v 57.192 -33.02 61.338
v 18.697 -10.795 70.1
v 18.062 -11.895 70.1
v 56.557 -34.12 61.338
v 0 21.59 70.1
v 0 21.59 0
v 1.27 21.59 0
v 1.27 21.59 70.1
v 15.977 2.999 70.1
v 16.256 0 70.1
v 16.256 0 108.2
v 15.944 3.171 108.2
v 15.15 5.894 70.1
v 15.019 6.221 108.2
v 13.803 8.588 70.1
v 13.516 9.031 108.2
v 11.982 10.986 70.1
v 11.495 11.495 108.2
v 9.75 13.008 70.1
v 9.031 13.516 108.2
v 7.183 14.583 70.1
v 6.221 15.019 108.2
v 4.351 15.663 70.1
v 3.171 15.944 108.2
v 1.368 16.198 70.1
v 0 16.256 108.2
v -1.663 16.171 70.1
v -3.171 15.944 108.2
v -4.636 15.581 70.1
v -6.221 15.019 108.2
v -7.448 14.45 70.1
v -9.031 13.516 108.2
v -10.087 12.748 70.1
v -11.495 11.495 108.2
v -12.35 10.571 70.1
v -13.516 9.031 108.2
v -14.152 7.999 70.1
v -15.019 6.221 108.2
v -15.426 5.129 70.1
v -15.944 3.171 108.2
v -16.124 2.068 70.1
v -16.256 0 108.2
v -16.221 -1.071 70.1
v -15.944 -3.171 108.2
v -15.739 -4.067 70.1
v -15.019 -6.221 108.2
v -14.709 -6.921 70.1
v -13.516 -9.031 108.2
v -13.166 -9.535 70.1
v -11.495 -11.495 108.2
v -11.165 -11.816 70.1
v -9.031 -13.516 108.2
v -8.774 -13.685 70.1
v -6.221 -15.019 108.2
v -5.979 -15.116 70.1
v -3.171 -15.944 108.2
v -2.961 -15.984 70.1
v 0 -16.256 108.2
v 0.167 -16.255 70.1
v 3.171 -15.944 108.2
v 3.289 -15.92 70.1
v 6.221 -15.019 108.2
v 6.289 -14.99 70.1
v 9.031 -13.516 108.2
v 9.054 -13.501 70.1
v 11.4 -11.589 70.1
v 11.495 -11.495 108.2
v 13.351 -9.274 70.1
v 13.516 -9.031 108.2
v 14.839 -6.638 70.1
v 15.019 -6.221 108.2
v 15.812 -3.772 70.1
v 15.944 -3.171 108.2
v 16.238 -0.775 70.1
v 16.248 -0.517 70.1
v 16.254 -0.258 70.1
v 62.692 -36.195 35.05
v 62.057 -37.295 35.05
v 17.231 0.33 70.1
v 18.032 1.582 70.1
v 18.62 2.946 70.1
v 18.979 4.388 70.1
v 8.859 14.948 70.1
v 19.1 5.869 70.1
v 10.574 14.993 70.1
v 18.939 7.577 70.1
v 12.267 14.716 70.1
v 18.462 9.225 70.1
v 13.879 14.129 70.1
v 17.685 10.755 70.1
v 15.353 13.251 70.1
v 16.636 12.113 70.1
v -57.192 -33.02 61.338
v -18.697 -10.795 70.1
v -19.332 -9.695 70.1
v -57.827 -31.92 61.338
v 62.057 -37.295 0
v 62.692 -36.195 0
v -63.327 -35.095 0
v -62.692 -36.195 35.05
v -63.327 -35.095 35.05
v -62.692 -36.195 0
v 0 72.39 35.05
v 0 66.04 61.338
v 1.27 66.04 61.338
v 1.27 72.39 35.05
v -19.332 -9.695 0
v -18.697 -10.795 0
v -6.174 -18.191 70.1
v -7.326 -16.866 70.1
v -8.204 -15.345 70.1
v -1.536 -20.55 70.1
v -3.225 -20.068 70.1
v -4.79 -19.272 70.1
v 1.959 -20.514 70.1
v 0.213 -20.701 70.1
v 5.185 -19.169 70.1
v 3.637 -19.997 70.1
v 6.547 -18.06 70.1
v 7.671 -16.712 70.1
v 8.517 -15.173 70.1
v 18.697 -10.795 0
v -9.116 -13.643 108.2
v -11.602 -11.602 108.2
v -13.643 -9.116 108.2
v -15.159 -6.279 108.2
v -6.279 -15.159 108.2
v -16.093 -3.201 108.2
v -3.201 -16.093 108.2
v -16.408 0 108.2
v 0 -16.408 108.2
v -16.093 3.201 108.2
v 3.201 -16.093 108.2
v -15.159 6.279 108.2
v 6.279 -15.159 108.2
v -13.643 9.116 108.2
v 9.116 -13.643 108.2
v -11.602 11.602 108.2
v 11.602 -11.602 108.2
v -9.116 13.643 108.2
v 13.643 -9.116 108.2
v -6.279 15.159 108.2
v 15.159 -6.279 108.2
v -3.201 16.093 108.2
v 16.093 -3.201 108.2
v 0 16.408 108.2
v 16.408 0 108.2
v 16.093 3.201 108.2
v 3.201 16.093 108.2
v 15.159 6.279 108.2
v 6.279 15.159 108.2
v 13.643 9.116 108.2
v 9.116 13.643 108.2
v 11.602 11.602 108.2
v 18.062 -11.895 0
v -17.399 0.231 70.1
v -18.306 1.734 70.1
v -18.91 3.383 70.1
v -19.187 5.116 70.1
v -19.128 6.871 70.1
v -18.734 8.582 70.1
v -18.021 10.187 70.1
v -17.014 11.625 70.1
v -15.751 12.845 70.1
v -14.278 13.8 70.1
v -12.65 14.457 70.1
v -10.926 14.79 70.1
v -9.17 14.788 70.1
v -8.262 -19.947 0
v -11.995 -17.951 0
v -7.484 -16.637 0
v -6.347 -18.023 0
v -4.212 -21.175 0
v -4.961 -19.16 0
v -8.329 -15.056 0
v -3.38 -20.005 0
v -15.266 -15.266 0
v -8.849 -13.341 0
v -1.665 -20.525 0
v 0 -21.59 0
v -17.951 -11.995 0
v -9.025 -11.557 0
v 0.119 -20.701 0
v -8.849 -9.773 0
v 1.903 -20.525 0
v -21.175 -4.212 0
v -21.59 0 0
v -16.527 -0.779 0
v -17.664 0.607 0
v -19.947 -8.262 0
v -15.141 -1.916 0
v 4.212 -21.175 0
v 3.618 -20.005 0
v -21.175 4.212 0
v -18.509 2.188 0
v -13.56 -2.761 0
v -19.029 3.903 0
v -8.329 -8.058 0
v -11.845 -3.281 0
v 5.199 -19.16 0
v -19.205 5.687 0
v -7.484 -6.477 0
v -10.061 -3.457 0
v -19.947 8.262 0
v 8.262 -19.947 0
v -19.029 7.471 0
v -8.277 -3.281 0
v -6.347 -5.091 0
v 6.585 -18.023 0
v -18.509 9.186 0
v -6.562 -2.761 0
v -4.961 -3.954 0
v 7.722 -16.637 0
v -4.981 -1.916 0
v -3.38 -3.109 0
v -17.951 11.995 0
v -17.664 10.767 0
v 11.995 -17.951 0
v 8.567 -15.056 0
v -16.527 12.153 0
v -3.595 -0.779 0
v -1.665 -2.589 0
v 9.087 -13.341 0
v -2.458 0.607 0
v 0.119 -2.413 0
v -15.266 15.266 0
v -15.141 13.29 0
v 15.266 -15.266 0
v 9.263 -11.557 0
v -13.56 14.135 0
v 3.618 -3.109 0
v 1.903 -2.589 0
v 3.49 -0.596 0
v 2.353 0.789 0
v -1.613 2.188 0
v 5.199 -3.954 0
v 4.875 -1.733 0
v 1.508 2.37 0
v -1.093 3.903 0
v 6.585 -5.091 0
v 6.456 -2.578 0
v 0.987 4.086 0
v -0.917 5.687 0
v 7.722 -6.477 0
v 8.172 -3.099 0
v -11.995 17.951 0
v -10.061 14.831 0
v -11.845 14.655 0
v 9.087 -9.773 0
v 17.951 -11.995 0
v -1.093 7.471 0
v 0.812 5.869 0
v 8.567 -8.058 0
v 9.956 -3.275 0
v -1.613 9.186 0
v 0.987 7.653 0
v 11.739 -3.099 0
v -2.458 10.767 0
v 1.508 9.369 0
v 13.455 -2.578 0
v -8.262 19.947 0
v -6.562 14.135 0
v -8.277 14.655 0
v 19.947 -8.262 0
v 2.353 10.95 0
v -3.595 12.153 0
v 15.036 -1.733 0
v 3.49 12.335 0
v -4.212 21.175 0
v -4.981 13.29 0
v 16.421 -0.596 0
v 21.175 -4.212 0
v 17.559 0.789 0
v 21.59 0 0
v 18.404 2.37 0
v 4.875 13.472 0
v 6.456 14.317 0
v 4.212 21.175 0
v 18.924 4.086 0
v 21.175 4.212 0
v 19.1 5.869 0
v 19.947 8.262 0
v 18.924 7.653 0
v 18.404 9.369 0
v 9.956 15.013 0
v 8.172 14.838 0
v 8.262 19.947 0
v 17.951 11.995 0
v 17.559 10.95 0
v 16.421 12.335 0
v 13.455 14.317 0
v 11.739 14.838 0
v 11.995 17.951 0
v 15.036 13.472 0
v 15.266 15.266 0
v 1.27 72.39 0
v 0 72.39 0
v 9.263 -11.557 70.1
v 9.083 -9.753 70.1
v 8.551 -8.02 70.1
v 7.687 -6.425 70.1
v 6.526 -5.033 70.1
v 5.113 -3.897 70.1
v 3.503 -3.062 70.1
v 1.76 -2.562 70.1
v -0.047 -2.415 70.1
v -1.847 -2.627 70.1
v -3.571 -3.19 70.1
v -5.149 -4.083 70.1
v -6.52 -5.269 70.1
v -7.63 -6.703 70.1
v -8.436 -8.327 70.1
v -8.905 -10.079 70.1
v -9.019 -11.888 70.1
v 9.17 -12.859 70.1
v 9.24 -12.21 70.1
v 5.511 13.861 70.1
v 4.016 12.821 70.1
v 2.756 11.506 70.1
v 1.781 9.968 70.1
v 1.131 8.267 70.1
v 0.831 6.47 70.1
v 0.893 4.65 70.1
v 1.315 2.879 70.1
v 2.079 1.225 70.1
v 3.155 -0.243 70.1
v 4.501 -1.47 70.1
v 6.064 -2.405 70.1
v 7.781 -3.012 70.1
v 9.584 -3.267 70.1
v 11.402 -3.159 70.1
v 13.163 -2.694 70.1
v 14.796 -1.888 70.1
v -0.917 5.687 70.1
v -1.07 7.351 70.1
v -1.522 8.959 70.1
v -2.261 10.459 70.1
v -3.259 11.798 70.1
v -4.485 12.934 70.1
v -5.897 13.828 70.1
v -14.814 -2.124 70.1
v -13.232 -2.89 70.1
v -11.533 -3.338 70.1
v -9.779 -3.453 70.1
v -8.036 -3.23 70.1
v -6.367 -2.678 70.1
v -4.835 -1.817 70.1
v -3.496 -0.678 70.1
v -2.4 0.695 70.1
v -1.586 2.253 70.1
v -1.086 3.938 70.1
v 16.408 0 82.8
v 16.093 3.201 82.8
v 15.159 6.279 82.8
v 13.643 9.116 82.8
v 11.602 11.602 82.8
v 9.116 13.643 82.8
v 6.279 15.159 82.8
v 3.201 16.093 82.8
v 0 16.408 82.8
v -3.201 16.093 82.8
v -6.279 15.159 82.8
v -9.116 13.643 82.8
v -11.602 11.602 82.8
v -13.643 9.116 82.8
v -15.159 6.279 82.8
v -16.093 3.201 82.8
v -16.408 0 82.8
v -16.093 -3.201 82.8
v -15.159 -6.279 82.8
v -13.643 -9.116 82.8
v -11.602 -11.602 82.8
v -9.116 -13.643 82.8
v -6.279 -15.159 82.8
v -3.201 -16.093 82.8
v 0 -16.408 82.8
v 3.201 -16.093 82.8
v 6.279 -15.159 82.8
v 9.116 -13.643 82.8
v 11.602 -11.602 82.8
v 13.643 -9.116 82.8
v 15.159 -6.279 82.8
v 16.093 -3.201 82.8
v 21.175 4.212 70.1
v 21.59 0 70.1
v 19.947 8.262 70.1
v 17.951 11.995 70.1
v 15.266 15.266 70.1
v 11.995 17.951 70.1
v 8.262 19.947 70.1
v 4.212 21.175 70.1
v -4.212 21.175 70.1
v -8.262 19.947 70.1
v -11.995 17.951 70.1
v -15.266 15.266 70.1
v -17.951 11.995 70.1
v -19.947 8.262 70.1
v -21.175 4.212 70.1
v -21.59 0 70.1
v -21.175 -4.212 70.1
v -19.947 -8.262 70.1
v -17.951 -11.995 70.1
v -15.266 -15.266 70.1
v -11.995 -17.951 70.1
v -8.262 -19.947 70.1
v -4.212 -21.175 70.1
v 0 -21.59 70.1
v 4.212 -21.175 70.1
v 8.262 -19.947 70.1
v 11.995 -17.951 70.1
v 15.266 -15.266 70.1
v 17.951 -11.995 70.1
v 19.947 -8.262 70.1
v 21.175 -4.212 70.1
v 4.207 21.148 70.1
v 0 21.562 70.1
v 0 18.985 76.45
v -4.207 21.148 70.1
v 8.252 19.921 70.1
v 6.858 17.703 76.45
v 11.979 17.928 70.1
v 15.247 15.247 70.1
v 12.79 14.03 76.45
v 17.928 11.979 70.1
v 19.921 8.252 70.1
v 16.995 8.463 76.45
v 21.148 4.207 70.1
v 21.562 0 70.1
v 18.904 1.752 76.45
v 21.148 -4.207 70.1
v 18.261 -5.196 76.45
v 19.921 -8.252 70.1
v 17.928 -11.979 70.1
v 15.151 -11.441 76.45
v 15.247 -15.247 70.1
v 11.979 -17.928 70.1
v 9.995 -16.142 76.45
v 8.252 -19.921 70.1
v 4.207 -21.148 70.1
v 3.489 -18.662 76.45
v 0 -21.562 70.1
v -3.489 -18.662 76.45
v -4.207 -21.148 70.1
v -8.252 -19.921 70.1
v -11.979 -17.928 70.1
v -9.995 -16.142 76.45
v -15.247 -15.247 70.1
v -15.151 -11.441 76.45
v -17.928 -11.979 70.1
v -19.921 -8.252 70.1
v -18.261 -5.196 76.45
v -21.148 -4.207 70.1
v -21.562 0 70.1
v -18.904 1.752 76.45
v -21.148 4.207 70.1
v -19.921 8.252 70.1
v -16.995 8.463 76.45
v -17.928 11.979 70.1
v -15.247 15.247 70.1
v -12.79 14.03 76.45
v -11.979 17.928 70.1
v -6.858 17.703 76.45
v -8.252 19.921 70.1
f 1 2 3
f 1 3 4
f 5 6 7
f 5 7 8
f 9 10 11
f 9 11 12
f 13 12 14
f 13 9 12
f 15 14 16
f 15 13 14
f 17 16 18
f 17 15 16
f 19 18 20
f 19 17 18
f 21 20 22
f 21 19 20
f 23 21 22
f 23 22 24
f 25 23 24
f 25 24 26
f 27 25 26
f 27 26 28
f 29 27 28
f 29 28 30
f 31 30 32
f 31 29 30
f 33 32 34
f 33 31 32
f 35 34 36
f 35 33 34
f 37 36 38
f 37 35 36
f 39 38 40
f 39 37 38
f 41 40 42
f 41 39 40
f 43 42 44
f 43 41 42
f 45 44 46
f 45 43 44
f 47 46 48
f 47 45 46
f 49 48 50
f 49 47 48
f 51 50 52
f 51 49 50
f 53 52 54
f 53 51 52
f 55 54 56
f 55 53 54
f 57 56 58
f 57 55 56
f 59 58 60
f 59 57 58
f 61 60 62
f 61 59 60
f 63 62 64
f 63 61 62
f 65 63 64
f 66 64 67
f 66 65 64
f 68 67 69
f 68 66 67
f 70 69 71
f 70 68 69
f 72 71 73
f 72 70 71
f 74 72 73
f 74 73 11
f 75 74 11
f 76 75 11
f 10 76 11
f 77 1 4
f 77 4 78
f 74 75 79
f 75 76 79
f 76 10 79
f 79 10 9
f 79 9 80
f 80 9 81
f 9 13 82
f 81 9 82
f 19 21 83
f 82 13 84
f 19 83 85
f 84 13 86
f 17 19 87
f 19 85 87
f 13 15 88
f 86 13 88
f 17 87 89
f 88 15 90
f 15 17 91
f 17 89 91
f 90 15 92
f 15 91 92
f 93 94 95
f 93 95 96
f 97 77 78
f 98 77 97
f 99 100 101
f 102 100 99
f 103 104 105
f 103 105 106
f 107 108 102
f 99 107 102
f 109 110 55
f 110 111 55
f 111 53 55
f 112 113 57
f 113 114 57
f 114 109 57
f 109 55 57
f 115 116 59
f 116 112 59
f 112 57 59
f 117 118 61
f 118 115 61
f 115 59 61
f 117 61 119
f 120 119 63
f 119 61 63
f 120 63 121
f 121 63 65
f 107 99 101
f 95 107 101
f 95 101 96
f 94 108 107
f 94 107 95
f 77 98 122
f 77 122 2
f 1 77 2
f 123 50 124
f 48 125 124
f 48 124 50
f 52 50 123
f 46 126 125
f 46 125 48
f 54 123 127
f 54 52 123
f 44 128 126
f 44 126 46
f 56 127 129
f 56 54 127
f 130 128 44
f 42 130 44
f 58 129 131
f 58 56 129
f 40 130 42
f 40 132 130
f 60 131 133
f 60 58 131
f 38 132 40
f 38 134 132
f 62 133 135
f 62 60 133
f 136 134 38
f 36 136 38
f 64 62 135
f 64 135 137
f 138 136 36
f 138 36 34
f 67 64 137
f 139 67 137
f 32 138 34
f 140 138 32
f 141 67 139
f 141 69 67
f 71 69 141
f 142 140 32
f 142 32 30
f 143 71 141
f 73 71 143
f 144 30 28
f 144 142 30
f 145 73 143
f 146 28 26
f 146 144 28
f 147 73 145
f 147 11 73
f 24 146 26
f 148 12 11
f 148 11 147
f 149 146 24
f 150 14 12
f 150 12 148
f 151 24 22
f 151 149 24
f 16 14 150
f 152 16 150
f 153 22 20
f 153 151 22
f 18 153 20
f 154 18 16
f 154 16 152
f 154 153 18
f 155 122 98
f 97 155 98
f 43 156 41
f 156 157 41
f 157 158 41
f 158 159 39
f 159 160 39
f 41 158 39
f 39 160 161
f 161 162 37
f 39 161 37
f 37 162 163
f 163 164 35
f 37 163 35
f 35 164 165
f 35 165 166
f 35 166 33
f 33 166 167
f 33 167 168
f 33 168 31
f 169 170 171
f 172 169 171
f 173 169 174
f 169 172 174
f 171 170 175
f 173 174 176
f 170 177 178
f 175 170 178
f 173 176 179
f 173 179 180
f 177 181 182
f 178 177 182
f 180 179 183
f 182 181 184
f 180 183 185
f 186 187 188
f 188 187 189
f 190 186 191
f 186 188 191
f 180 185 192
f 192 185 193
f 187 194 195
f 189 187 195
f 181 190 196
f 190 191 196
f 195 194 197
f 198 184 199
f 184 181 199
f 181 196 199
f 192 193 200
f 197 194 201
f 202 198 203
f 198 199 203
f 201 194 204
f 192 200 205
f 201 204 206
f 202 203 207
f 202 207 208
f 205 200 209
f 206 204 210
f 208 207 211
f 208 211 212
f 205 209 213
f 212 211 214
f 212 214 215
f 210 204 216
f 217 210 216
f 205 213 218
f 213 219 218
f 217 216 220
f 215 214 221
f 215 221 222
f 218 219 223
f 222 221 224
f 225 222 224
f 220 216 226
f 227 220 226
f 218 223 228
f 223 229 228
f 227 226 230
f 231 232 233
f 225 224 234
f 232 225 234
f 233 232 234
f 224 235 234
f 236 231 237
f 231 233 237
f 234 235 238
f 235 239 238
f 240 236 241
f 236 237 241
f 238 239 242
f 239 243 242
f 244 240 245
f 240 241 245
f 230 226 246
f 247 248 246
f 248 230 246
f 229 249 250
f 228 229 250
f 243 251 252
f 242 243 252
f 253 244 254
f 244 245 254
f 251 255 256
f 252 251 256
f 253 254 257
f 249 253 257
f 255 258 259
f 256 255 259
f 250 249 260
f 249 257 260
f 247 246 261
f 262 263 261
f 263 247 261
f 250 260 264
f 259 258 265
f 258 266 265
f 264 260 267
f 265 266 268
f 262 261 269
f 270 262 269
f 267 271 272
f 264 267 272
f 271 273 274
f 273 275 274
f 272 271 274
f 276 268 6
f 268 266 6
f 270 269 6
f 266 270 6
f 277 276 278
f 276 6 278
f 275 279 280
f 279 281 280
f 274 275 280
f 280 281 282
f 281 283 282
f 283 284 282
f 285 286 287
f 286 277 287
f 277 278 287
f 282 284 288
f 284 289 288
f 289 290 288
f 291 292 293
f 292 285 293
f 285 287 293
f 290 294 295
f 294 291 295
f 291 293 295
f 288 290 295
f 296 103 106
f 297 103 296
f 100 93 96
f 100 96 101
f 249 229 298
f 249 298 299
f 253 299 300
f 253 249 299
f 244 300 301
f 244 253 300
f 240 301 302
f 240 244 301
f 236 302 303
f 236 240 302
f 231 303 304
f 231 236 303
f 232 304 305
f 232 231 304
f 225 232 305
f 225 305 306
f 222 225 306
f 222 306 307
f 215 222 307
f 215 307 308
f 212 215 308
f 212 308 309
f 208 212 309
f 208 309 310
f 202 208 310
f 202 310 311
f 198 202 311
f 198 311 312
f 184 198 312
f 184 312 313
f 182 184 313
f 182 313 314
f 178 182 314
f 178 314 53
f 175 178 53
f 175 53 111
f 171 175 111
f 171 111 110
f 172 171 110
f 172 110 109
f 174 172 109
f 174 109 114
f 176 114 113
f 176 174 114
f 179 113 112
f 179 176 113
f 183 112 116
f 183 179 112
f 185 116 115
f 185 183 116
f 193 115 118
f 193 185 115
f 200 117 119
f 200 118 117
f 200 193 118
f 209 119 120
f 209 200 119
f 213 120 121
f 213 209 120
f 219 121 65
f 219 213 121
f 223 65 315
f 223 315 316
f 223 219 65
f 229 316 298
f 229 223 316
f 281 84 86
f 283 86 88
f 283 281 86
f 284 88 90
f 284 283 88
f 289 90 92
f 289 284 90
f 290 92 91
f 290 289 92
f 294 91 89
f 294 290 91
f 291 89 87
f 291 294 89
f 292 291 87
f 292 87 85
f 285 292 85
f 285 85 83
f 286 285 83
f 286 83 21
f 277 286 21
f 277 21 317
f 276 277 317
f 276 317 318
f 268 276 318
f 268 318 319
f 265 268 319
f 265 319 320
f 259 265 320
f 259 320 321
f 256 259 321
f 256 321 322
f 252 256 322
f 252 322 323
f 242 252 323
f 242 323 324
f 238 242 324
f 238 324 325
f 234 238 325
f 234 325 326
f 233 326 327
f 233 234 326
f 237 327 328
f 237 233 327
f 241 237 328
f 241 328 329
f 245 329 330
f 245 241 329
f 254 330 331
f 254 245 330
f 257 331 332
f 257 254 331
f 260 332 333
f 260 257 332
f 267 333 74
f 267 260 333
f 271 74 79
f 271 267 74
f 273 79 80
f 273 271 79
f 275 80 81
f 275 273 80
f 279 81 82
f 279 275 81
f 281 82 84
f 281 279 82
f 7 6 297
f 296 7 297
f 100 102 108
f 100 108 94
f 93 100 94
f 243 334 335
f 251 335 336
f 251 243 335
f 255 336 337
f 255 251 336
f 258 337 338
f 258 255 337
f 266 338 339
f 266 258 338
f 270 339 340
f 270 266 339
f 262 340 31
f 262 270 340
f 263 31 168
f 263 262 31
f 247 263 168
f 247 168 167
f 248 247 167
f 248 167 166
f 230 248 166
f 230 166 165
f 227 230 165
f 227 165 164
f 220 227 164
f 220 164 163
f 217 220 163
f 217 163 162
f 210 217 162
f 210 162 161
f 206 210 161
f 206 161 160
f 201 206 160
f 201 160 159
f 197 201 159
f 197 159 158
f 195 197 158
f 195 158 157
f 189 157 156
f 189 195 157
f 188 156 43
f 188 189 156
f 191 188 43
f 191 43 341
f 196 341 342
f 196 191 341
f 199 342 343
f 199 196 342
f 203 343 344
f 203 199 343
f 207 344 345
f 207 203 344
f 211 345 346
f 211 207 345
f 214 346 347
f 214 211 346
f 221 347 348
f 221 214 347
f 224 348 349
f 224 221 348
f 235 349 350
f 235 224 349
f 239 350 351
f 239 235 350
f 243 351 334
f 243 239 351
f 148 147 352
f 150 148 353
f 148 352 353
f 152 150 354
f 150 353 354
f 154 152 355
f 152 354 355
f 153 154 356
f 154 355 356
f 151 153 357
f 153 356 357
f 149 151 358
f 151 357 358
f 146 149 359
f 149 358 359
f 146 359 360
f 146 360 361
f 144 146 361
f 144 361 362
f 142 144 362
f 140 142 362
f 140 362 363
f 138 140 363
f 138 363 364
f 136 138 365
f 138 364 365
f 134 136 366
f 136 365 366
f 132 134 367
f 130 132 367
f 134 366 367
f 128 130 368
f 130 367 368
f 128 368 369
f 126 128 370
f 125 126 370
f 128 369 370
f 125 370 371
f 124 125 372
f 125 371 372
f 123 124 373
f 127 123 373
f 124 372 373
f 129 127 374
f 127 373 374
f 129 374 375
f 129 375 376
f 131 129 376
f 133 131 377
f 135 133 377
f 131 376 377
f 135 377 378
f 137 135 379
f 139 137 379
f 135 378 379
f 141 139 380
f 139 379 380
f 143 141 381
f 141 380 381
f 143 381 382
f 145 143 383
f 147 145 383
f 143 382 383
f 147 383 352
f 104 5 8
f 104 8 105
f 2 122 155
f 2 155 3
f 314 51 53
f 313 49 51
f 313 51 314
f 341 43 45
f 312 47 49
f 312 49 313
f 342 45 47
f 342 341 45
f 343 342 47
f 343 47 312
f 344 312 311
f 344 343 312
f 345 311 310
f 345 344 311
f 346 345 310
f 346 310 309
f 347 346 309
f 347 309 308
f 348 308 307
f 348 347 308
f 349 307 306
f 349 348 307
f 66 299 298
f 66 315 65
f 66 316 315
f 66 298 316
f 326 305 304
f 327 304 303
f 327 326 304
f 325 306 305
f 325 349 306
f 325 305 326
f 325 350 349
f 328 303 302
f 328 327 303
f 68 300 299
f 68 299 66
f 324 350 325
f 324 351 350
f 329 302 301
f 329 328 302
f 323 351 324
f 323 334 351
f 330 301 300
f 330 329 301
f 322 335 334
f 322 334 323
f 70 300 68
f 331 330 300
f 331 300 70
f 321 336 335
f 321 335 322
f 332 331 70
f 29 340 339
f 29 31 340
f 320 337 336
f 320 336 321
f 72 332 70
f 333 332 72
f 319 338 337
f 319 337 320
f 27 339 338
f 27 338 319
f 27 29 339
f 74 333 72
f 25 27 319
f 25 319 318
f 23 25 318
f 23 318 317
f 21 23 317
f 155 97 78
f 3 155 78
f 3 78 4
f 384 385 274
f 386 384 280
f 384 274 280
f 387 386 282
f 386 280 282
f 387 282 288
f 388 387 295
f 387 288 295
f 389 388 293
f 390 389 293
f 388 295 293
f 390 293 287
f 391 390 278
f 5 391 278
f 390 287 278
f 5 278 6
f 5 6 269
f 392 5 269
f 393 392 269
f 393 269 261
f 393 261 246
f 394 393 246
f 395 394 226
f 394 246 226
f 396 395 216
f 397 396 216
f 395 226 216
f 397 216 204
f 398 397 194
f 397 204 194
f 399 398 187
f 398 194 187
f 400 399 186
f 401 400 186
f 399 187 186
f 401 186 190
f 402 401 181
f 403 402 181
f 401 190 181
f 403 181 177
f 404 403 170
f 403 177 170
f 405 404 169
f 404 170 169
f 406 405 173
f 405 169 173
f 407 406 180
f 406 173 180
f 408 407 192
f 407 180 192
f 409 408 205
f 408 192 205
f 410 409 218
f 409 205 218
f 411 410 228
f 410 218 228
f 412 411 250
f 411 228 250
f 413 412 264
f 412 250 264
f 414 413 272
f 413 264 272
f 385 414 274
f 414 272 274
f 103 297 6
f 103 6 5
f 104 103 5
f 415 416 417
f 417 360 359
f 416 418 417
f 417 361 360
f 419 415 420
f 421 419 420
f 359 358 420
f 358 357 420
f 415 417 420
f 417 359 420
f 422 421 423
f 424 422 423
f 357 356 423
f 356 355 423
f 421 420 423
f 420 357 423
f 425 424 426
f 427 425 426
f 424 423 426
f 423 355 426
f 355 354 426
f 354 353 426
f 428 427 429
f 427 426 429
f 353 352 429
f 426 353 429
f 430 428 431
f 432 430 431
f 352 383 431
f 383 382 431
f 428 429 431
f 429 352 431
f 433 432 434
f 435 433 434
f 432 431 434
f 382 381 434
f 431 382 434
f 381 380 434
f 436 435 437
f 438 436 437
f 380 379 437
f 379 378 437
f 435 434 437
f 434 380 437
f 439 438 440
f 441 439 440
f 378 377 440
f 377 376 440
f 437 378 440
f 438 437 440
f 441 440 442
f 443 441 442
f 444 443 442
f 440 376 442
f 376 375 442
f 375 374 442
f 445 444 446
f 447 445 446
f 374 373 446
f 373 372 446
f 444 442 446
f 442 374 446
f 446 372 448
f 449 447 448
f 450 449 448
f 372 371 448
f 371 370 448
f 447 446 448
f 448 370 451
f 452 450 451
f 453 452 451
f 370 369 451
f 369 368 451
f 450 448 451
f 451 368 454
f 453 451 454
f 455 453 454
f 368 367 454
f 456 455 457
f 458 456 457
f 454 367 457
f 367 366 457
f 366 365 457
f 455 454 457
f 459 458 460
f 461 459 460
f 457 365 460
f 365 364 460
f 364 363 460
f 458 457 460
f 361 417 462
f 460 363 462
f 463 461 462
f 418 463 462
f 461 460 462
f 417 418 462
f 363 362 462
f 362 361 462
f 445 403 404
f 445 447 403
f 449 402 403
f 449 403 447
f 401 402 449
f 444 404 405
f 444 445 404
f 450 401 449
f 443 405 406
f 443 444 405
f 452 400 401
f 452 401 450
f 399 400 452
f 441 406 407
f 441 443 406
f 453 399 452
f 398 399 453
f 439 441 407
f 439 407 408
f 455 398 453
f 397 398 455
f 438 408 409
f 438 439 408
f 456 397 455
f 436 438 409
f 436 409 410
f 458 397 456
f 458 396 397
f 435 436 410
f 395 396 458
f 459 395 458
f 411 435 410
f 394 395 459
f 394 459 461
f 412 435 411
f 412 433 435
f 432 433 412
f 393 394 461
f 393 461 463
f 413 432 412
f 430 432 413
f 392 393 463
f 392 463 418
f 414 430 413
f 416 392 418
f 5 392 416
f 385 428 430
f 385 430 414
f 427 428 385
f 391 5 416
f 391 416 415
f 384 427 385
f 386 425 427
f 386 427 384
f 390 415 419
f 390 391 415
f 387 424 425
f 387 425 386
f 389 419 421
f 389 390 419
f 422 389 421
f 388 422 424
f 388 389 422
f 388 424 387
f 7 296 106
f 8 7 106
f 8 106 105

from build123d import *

# Parameters (mm, degrees)
SKETCH1_R           = 21.59
SKETCH1_R_2         = 9.144
BOSS_EXTRUDE1_DEPTH = 70.1
SKETCH2_R           = 16.4084
SKETCH2_R_2         = 16.256
BOSS_EXTRUDE2_DEPTH = 38.1
BOSS_EXTRUDE6_DEPTH = 1.27
CIRPATTERN7_COUNT   = 3


with BuildPart() as part:
    # Sketch1 → Boss-Extrude1 (new body)
    with BuildSketch(Plane.XY):
        Circle(SKETCH1_R)
        with Locations((0.118855304, -11.557)):
            Circle(SKETCH1_R_2, mode=Mode.SUBTRACT)
        with Locations((9.955579479, 5.869470694)):
            Circle(SKETCH1_R_2, mode=Mode.SUBTRACT)
        with Locations((-10.060900468, 5.687049391)):
            Circle(SKETCH1_R_2, mode=Mode.SUBTRACT)
    extrude(amount=BOSS_EXTRUDE1_DEPTH)

    # Sketch2 → Boss-Extrude2 (add)
    with BuildSketch(Plane.XY.offset(70.1)):
        Circle(SKETCH2_R)
        Circle(SKETCH2_R_2, mode=Mode.SUBTRACT)
    extrude(amount=BOSS_EXTRUDE2_DEPTH)

    # Sketch8 → Revolve3 (revolve)
    with BuildSketch(Plane(origin=(0, 0, 0), x_dir=(0, 0, -1), z_dir=(1, 0, 0))):
        Polygon((-70.1, 21.56234654), (-82.8, 16.4084), (-70.1, 16.4084), align=None)
    revolve(axis=Axis((0, 0, 126.159811209), (0, 0, -1)))


with BuildPart() as body_2:
    # Sketch14 → Boss-Extrude6 (new body)
    with BuildSketch(Plane(origin=(0, 0, 0), x_dir=(0, 0, -1), z_dir=(1, 0, 0))):
        Polygon((-70.1, 21.59), (-61.3375, 66.04), (-35.05, 72.39), (0, 72.39), (0, 46.99), (0, 21.59), align=None)
    extrude(amount=BOSS_EXTRUDE6_DEPTH)


with BuildPart() as cirpattern7_1:
    # CirPattern7: pattern copy
    add(body_2.part.rotate(Axis((0, 0, 0), (0, 0, 1)), 1 * 360 / CIRPATTERN7_COUNT))


with BuildPart() as cirpattern7_2:
    # CirPattern7: pattern copy
    add(body_2.part.rotate(Axis((0, 0, 0), (0, 0, 1)), 2 * 360 / CIRPATTERN7_COUNT))


solid = Compound([part.part, body_2.part, cirpattern7_1.part, cirpattern7_2.part])
